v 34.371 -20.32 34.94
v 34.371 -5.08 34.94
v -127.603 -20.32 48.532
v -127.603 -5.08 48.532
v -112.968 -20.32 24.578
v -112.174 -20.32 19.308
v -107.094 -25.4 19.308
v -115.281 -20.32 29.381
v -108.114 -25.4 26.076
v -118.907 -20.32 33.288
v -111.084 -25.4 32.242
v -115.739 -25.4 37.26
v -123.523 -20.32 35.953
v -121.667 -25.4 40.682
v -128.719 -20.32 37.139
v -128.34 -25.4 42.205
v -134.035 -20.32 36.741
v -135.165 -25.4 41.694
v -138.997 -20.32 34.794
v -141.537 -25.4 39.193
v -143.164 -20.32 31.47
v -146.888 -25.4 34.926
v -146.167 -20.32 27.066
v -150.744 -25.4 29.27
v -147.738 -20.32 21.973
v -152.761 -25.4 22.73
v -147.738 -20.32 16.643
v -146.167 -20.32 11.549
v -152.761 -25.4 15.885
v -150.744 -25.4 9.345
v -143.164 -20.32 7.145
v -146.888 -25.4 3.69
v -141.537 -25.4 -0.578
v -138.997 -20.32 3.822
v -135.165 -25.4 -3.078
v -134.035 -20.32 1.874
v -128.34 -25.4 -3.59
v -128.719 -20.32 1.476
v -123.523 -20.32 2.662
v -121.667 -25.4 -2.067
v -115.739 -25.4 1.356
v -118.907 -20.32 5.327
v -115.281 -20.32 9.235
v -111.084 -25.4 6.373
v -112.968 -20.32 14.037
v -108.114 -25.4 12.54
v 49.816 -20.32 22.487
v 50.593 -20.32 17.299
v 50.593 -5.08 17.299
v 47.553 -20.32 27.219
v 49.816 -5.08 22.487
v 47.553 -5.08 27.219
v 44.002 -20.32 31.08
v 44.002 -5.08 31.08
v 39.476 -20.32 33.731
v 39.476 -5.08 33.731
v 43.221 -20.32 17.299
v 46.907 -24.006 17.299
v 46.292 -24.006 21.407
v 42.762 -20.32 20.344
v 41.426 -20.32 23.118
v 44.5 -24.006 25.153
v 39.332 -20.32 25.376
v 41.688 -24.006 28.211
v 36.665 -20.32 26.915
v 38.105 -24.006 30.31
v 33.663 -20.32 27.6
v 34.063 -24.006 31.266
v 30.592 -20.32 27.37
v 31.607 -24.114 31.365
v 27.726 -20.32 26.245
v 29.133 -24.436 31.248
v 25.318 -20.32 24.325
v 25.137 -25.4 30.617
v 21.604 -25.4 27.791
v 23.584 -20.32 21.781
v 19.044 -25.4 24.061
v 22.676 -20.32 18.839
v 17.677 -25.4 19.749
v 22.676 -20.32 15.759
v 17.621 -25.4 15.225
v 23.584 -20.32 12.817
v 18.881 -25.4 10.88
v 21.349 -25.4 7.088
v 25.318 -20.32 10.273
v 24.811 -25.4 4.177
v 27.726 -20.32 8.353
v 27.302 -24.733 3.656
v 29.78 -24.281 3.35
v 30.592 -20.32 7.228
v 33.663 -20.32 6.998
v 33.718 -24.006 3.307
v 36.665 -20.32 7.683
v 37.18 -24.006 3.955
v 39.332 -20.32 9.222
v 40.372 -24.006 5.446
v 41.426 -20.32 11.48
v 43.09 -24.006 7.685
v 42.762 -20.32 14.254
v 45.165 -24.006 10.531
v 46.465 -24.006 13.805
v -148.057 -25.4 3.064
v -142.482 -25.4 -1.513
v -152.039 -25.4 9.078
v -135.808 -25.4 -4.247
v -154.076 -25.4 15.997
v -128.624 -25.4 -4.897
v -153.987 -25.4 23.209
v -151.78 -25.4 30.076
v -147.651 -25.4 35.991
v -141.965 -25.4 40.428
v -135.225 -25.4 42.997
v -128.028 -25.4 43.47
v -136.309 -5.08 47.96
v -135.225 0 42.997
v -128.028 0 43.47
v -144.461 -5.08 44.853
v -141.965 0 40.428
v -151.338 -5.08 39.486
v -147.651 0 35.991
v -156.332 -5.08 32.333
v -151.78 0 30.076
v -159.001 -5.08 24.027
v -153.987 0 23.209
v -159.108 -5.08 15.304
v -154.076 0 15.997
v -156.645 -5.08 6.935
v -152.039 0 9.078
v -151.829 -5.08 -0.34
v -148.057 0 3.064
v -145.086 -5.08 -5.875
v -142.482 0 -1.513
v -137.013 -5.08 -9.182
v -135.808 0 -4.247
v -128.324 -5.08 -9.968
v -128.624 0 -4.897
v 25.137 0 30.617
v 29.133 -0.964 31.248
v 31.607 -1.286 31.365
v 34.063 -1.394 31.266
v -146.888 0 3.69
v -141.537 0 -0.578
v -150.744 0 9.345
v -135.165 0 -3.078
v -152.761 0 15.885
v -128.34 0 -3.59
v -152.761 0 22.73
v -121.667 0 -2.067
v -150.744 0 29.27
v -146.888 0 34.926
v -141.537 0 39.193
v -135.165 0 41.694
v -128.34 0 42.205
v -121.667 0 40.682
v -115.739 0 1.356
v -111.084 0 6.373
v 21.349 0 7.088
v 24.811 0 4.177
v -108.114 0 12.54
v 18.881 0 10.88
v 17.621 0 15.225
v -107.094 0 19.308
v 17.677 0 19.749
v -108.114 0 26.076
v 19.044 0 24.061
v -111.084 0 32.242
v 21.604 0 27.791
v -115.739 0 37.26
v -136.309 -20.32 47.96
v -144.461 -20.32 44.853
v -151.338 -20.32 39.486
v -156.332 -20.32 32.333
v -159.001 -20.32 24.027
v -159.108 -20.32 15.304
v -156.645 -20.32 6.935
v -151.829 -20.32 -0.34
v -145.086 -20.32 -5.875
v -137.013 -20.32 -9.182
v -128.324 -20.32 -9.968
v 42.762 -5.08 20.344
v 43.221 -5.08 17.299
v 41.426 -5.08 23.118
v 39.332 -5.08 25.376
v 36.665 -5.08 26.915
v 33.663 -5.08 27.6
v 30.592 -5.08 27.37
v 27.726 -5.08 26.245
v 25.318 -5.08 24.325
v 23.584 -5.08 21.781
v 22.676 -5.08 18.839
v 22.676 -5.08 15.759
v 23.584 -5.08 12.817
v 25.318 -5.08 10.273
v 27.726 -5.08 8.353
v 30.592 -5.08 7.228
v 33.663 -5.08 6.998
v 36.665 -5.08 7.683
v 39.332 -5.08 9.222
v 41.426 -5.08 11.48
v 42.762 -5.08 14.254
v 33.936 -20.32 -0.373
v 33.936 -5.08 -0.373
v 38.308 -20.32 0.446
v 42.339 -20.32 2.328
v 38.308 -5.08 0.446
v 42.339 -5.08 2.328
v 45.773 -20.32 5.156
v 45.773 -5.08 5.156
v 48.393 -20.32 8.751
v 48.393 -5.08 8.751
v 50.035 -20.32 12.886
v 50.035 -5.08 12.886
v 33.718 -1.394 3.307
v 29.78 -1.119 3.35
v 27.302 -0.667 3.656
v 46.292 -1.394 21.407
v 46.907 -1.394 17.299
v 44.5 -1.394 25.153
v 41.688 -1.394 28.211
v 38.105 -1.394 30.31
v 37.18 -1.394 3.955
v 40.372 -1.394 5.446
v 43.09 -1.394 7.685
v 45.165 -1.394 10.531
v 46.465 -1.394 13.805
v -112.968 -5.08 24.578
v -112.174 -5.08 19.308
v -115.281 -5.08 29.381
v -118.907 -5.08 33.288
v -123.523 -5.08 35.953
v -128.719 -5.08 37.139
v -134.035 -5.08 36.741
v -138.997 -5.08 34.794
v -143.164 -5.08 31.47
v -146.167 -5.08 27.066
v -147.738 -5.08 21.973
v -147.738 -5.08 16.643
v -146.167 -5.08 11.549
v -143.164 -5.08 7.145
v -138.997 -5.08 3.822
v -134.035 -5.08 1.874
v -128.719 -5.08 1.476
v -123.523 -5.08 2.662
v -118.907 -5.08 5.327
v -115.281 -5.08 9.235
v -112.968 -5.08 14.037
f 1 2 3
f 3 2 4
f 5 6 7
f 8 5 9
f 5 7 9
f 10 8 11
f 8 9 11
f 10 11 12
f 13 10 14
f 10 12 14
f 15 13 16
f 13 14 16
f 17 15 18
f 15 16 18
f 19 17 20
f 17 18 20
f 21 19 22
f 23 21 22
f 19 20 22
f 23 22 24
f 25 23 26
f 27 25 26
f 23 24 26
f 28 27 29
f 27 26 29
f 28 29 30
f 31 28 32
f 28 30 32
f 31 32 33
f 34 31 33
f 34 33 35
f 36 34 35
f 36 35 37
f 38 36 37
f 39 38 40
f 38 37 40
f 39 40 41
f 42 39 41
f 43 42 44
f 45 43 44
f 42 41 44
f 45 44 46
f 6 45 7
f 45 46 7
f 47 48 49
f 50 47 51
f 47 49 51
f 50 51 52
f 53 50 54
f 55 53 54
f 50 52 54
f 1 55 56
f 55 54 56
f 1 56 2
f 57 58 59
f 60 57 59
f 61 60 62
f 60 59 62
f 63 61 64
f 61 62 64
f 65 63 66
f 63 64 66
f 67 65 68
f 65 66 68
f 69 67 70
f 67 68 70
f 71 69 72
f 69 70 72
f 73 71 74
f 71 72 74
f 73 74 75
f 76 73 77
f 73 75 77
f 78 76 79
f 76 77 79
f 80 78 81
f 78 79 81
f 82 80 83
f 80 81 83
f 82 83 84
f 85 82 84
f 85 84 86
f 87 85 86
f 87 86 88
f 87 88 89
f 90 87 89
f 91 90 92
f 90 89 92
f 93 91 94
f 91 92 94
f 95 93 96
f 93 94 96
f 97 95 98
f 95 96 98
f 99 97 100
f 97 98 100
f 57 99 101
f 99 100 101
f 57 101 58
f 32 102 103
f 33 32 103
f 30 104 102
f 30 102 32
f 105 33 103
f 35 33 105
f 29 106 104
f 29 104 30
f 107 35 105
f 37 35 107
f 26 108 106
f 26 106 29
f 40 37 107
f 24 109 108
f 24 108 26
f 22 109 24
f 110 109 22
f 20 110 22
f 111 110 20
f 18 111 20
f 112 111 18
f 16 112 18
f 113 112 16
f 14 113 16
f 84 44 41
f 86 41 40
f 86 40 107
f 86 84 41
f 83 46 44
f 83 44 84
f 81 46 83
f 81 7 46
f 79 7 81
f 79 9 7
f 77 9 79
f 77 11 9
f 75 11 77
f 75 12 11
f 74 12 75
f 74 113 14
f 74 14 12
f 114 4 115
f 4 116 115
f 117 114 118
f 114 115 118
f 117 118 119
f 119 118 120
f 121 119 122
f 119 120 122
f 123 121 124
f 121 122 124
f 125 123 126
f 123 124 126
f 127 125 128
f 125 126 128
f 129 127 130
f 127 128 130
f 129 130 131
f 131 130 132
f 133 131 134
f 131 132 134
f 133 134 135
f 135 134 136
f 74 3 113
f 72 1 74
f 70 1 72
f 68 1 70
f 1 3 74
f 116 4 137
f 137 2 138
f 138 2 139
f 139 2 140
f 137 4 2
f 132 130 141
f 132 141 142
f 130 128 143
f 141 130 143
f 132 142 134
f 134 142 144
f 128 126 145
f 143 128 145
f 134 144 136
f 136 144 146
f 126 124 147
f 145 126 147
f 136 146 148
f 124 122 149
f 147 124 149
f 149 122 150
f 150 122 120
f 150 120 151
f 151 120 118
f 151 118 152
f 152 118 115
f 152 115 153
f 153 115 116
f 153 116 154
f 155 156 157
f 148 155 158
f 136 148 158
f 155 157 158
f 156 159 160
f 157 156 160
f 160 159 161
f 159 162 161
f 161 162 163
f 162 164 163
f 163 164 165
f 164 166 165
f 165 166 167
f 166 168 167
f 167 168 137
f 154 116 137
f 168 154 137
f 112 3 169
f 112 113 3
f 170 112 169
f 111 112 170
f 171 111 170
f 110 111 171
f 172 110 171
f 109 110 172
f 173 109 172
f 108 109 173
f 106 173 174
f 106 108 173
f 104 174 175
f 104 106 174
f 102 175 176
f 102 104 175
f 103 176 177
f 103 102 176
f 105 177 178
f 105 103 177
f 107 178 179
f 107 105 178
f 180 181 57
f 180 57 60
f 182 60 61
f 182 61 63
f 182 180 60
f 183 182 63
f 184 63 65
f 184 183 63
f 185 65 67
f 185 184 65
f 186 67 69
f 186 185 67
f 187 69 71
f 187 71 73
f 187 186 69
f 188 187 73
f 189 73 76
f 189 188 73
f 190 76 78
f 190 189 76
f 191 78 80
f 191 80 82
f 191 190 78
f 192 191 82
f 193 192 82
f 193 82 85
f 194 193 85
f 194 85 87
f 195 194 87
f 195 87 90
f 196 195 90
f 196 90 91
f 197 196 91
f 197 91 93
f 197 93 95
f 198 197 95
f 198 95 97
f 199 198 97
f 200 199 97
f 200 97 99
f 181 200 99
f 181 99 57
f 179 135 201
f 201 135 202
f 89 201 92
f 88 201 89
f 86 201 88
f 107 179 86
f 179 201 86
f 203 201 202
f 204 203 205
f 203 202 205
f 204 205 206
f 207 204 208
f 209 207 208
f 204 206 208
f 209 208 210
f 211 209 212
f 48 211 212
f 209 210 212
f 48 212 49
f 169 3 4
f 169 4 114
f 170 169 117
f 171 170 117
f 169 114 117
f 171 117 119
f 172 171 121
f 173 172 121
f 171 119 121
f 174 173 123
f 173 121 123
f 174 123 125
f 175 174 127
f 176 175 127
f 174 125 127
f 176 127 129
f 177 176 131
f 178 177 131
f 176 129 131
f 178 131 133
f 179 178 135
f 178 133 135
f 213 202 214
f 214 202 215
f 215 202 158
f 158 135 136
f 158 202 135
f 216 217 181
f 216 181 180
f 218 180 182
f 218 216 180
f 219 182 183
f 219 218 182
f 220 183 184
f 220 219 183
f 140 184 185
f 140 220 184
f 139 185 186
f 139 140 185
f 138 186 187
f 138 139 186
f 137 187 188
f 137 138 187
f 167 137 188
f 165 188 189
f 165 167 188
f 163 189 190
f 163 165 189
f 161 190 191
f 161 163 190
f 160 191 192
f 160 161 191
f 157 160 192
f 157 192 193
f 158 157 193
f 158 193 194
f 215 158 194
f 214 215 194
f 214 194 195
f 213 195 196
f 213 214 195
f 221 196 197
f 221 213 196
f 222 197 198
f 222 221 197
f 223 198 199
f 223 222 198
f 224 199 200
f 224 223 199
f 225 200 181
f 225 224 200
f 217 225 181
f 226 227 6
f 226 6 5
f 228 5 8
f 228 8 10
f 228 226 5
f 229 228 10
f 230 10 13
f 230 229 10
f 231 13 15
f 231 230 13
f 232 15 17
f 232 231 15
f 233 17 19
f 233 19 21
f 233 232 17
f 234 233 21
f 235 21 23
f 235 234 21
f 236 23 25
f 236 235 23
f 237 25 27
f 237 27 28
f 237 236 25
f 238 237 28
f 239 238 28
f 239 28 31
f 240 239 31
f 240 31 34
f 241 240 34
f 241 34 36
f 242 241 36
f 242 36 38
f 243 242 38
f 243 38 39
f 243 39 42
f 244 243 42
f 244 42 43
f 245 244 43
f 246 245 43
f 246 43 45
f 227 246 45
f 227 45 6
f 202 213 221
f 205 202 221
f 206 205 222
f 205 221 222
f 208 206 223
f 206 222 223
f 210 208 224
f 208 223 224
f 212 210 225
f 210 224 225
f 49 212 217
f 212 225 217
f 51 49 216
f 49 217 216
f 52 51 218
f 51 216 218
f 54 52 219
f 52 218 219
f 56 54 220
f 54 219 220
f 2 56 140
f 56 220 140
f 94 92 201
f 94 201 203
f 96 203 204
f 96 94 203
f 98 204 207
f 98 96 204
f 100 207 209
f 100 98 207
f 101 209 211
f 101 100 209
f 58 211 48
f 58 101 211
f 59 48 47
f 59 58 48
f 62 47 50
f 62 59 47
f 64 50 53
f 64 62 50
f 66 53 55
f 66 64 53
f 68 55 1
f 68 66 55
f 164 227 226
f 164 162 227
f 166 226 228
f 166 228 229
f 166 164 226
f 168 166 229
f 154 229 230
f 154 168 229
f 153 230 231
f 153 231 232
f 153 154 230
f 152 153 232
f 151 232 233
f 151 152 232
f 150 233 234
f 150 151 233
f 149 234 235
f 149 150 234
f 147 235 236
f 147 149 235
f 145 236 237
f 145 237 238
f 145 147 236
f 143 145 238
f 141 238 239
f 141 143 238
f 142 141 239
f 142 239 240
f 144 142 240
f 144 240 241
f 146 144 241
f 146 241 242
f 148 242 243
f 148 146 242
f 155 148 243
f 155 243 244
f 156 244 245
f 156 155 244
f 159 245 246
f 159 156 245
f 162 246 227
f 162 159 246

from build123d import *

# Parameters (mm, degrees)
F0_R         = 17.8816960504
F0_R_2       = 10.3302818728
F1_DEPTH     = 25.4
F2_T1_DEPTH  = 162.5438125483
F2_T3_DEPTH  = 162.5438125483
F2_T6_ANGLE  = 188.1812058846
F2_T8_ANGLE  = 171.8187941154
F2_T10_ANGLE = 188.1812058846
F2_T12_ANGLE = 171.8187941154


# Not quite as in the source:
# - a fillet or chamfer that OpenCascade refuses, or shapes differently, is made with other operations: its cross-section is extruded or revolved along the edge and cut away or added


with BuildPart() as f1:
    # F0 (on Front) → F1 (new body)
    with BuildSketch(Plane.XZ):
        with BuildLine():
            ThreePointArc((-128.3244462029, -9.9682561267), (-108.7150059464, -0.8082782893), (-100.7286188282, 19.3077094309))
            ThreePointArc((-100.7286188282, 19.3077094309), (-108.4686726557, 39.1591179408), (-127.6033017493, 48.5321015922))
            ThreePointArc((-127.6033017493, 48.5321015922), (-159.38061509, 19.669202563), (-128.3244462029, -9.9682561267))
        make_face()
        with Locations((-130.0557309645, 19.3077094309)):
            Circle(F0_R, mode=Mode.SUBTRACT)
        with BuildLine():
            ThreePointArc((-127.6033017493, 48.5321015922), (-108.4686726557, 39.1591179408), (-100.7286188282, 19.3077094309))
            ThreePointArc((-100.7286188282, 19.3077094309), (-108.7150059464, -0.8082782893), (-128.3244462029, -9.9682561267))
            Line((-128.3244462029, -9.9682561267), (33.9358894089, -0.3727110744))
            ThreePointArc((33.9358894089, -0.3727110744), (15.1895627408, 17.5172445164), (34.3711913147, 34.9396553669))
            Line((34.3711913147, 34.9396553669), (-127.6033017493, 48.5321015922))
        make_face()
        with BuildLine():
            ThreePointArc((50.5934622257, 17.2990376807), (45.9213605892, 29.2818740087), (34.3711913147, 34.9396553669))
            ThreePointArc((34.3711913147, 34.9396553669), (15.1895627408, 17.5172445164), (33.9358894089, -0.3727110744))
            ThreePointArc((33.9358894089, -0.3727110744), (45.772667286, 5.1564943288), (50.5934622257, 17.2990376807))
        make_face()
        with Locations((32.89084004, 17.2990376807)):
            Circle(F0_R_2, mode=Mode.SUBTRACT)
    extrude(amount=F1_DEPTH)

    # F2: chamfer of 5.08 on 12 edges, made by hand

    # F2_s2 → F2_t1 (cut)
    with BuildSketch(Plane(origin=(31.219303845, 0, -2.6198366217), x_dir=(0, 1, 0), z_dir=(-0.9964974398, 0, 0.0836232768))):
        Polygon((-20.32, -37.691508766), (-25.4, -32.611508766), (-25.4, -37.691508766), align=None)
        Polygon((-5.08, -37.691508766), (0, -32.611508766), (0, -37.691508766), align=None)
    extrude(amount=F2_T1_DEPTH, mode=Mode.SUBTRACT)

    # F2_s4 → F2_t3 (cut)
    with BuildSketch(Plane(origin=(-128.4646756887, 0, -7.5969803622), x_dir=(0, 1, 0), z_dir=(0.9982559968, 0, 0.0590335916))):
        Polygon((-20.32, -2.3754185022), (-25.4, 2.7045814978), (-25.4, -2.3754185022), align=None)
        Polygon((-5.08, -2.3754185022), (0, 2.7045814978), (0, -2.3754185022), align=None)
    extrude(amount=F2_T3_DEPTH, mode=Mode.SUBTRACT)

    # F2_s5 → F2_t6 (revolve, cut)
    with BuildSketch(Plane(origin=(-130.755189219, 0, 10.9726096036), x_dir=(0, 1, 0), z_dir=(0.9964974398, 0, -0.0836232768))):
        Polygon((-20.32, 37.691508766), (-25.4, 32.611508766), (-25.4, 37.691508766), align=None)
    revolve(axis=Axis((-130.0557309645, -25.4, 19.3077094309), (0, -1, 0)), revolution_arc=F2_T6_ANGLE, mode=Mode.SUBTRACT)

    # F2_s7 → F2_t8 (revolve, cut)
    with BuildSketch(Plane(origin=(33.7956599231, 0, 1.9985646901), x_dir=(0, 1, 0), z_dir=(-0.9982559968, 0, -0.0590335916))):
        Polygon((-20.32, 2.3754185022), (-25.4, -2.7045814978), (-25.4, 2.3754185022), align=None)
    revolve(axis=Axis((32.89084004, -25.4, 17.2990376807), (0, -1, 0)), revolution_arc=F2_T8_ANGLE, mode=Mode.SUBTRACT)

    # F2_s9 → F2_t10 (revolve, cut)
    with BuildSketch(Plane(origin=(-130.755189219, 0, 10.9726096036), x_dir=(0, 1, 0), z_dir=(0.9964974398, 0, -0.0836232768))):
        Polygon((-5.08, 37.691508766), (0, 32.611508766), (0, 37.691508766), align=None)
    revolve(axis=Axis((-130.0557309645, 0, 19.3077094309), (0, -1, 0)), revolution_arc=F2_T10_ANGLE, mode=Mode.SUBTRACT)

    # F2_s11 → F2_t12 (revolve, cut)
    with BuildSketch(Plane(origin=(33.7956599231, 0, 1.9985646901), x_dir=(0, 1, 0), z_dir=(-0.9982559968, 0, -0.0590335916))):
        Polygon((-5.08, 2.3754185022), (0, -2.7045814978), (0, 2.3754185022), align=None)
    revolve(axis=Axis((32.89084004, 0, 17.2990376807), (0, -1, 0)), revolution_arc=F2_T12_ANGLE, mode=Mode.SUBTRACT)

    # F2_s13 → F2_t14 (revolve, cut)
    with BuildSketch(Plane.XY.offset(19.3077094309)):
        Polygon((-112.1740349142, -5.08), (-107.0940349142, 0), (-112.1740349142, 0), align=None)
    revolve(axis=Axis((-130.0557309645, 0, 19.3077094309), (0, -1, 0)), mode=Mode.SUBTRACT)

    # F2_s15 → F2_t16 (revolve, cut)
    with BuildSketch(Plane.XY.offset(19.3077094309)):
        Polygon((-112.1740349142, -20.32), (-107.0940349142, -25.4), (-112.1740349142, -25.4), align=None)
    revolve(axis=Axis((-130.0557309645, -25.4, 19.3077094309), (0, -1, 0)), mode=Mode.SUBTRACT)

    # F2_s17 → F2_t18 (revolve, cut)
    with BuildSketch(Plane.XY.offset(17.2990376807)):
        Polygon((43.2211219128, -20.32), (48.3011219128, -25.4), (43.2211219128, -25.4), align=None)
    revolve(axis=Axis((32.89084004, -25.4, 17.2990376807), (0, -1, 0)), mode=Mode.SUBTRACT)

    # F2_s19 → F2_t20 (revolve, cut)
    with BuildSketch(Plane.XY.offset(17.2990376807)):
        Polygon((43.2211219128, -5.08), (48.3011219128, 0), (43.2211219128, 0), align=None)
    revolve(axis=Axis((32.89084004, 0, 17.2990376807), (0, -1, 0)), mode=Mode.SUBTRACT)


solid = f1.part
